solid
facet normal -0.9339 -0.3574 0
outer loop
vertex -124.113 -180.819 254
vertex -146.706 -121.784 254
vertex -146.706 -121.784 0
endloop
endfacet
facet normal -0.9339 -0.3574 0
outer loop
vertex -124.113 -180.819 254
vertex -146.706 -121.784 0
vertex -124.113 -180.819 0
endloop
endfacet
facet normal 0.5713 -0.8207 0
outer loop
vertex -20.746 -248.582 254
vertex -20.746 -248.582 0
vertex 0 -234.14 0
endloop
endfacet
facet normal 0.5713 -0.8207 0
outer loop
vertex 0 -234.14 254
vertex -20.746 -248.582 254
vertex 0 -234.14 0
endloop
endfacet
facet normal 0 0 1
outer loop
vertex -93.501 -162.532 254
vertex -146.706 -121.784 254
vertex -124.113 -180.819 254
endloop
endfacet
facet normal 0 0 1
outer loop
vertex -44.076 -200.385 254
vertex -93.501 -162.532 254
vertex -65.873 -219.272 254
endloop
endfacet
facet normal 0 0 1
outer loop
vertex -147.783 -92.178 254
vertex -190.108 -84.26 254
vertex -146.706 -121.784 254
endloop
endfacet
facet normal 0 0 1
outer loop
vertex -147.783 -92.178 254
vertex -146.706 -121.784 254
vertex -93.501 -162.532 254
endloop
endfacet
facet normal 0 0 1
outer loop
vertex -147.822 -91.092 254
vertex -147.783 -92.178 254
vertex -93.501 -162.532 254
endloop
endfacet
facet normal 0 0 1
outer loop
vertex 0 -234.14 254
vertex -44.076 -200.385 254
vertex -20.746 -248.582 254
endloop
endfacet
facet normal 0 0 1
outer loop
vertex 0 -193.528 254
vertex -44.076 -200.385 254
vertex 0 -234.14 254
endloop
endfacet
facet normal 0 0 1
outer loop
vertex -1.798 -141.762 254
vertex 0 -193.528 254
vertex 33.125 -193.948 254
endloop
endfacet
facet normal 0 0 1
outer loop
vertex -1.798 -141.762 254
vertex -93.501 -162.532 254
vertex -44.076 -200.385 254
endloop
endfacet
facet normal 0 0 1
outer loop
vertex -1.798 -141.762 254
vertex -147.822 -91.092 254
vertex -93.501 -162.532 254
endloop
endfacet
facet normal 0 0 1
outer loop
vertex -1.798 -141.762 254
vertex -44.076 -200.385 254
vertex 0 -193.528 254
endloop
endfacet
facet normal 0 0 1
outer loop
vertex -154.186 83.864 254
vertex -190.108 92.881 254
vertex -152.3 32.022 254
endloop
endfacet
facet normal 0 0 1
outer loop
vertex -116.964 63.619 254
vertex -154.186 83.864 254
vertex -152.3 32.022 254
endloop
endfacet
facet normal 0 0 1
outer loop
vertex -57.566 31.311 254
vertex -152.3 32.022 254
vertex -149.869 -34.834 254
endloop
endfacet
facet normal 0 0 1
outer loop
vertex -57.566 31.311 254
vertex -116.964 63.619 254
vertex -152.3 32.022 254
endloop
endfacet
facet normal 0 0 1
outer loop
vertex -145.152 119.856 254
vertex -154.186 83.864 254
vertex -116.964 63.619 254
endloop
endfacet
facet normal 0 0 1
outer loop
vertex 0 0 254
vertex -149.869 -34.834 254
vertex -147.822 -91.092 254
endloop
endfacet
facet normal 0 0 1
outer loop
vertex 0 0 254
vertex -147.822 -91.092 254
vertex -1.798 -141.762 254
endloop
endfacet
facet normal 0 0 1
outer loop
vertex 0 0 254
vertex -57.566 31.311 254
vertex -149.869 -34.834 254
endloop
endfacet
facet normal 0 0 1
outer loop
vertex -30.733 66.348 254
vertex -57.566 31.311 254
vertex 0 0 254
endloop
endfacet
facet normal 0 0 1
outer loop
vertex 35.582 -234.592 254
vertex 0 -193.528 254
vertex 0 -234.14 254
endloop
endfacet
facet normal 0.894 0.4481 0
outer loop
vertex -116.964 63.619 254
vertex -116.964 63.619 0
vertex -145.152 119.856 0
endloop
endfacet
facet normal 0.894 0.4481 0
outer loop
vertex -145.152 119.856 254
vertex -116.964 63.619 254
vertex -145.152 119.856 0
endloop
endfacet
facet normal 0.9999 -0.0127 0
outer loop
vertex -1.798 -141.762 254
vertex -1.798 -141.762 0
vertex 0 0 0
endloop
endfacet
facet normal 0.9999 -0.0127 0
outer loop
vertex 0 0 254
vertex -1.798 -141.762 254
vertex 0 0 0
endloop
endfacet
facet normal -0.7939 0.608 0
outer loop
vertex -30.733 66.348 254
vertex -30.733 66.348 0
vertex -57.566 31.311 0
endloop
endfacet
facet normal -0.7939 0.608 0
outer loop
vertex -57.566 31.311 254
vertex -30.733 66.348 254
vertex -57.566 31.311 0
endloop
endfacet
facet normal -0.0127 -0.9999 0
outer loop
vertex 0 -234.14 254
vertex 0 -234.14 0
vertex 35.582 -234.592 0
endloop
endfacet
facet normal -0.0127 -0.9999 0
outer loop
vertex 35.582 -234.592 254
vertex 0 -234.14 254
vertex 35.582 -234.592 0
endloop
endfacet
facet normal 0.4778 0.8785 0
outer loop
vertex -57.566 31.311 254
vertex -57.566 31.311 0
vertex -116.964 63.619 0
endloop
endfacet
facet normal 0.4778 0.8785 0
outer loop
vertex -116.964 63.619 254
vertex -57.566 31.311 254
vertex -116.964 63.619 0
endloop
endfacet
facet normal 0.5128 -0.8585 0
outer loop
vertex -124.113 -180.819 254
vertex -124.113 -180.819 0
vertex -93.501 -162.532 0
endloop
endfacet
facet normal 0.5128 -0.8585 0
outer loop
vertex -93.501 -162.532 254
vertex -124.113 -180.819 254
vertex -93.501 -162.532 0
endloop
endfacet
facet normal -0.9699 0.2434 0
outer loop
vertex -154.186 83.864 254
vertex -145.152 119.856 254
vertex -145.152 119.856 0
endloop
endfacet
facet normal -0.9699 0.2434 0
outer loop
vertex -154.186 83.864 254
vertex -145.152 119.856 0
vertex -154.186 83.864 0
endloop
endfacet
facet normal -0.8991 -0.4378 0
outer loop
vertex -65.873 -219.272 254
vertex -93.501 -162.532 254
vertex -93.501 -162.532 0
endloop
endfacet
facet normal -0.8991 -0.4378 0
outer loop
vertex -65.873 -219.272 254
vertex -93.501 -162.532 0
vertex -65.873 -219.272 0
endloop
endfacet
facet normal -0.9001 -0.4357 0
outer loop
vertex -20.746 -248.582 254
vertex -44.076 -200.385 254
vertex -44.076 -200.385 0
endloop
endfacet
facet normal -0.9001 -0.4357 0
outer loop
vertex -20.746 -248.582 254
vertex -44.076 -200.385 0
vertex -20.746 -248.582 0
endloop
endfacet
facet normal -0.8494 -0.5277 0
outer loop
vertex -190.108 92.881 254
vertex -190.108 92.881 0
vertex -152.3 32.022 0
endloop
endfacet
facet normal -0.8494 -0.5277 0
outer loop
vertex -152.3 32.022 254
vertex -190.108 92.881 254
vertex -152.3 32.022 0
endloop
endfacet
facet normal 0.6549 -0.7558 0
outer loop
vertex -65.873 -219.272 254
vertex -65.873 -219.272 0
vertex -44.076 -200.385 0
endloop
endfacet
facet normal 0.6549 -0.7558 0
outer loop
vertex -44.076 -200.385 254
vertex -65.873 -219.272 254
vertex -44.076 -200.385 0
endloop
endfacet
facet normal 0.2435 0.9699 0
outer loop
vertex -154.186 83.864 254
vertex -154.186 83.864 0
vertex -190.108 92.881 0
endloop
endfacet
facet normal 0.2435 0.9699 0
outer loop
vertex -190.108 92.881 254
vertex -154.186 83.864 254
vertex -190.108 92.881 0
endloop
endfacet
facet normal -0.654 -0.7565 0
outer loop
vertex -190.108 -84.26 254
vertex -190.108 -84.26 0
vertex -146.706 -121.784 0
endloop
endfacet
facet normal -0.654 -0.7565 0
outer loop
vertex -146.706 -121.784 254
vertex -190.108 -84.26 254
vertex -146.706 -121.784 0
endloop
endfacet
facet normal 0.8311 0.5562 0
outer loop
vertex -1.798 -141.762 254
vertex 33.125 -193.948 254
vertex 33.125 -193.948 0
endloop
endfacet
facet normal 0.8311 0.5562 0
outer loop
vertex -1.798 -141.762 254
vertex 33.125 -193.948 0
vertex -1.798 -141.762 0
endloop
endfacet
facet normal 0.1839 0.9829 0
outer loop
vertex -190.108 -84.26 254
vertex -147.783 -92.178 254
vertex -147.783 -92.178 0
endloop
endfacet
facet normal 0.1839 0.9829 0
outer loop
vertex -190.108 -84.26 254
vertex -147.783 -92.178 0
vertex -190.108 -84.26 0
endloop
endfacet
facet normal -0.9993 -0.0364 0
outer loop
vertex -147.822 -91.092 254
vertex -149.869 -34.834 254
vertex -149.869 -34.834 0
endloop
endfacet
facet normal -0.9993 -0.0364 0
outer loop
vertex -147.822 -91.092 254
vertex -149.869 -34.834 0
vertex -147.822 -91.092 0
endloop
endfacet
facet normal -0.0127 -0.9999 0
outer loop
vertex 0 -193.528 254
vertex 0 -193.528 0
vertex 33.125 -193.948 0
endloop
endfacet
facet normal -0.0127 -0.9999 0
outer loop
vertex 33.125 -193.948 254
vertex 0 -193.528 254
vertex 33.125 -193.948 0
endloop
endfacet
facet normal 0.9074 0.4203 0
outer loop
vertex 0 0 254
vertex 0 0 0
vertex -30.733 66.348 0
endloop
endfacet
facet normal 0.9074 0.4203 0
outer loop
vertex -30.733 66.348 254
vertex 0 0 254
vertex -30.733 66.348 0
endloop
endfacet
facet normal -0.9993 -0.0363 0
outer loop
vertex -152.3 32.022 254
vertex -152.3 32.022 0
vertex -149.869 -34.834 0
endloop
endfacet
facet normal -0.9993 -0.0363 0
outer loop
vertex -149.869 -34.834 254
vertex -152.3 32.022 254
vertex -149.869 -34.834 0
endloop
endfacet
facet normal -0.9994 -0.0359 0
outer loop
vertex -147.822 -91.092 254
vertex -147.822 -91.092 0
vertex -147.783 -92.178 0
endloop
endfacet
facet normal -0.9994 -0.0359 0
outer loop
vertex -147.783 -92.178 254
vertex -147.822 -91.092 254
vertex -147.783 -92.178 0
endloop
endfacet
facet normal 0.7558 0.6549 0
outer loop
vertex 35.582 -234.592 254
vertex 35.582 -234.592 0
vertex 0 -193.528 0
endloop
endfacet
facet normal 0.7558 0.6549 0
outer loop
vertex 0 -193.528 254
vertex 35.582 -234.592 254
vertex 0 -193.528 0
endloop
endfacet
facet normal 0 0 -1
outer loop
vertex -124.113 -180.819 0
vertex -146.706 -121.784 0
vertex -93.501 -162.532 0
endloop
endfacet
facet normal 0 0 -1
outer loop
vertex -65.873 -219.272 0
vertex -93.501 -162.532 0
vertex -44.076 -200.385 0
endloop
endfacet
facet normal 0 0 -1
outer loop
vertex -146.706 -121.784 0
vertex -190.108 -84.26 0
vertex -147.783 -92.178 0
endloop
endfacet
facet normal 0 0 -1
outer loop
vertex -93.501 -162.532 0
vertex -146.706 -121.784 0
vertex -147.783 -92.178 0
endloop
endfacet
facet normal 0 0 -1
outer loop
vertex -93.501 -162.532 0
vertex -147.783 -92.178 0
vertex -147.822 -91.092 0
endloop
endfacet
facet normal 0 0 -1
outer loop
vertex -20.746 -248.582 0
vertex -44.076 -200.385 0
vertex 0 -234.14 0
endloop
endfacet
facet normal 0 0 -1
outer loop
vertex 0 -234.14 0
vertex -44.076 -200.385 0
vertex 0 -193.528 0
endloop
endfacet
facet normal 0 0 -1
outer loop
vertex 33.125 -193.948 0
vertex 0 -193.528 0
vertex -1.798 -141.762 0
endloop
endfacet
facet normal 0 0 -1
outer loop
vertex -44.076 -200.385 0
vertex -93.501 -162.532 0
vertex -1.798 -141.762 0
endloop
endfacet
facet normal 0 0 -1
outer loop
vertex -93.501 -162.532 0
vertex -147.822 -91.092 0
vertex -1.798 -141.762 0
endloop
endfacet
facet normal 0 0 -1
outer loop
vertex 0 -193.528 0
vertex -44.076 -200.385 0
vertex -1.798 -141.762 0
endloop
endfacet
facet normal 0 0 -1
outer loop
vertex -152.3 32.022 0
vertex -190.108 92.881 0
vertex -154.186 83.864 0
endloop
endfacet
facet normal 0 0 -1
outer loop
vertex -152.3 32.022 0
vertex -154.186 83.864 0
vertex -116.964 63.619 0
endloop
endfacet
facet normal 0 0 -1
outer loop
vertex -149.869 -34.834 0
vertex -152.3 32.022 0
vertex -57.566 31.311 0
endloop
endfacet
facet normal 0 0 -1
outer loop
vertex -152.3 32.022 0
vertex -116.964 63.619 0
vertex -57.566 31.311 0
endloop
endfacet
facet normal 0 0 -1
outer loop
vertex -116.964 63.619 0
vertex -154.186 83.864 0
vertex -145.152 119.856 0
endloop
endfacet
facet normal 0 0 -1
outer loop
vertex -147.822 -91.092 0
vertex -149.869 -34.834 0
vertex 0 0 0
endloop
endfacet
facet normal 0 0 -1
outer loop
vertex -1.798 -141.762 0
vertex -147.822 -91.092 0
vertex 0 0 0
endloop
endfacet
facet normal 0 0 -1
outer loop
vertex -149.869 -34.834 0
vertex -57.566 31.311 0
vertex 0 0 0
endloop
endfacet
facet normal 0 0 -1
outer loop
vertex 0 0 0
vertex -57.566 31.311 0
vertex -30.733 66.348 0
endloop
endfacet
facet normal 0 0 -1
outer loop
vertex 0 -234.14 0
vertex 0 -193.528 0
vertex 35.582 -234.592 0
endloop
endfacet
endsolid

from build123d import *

# Parameters (mm, degrees)
F1_DEPTH = 254


with BuildPart() as f1:
    # F0 (on Top) → F1 (new body)
    with BuildSketch(Plane.XY):
        Polygon((-147.782792, -92.178449), (-146.70594, -121.784464), (-93.500725, -162.532108), (-44.075843, -200.384555), (-2.940414, -231.888456), (-1.797586, -141.762128), (0, 0), (-57.565849, 31.310931), (-116.964364, 63.618676), (-154.185936, 83.864048), (-152.300298, 32.021948), (-149.868549, -34.834455), (-147.822325, -91.091555), (-146.70594, -92.379923), align=None)
        Polygon((-190.108119, -84.259592), (-146.70594, -121.784464), (-147.782792, -92.178449), align=None)
        Polygon((-93.500725, -162.532108), (-146.70594, -121.784464), (-124.113187, -180.818781), align=None)
        Polygon((-44.075843, -200.384555), (-93.500725, -162.532108), (-65.873049, -219.272062), align=None)
        Polygon((-147.822325, -91.091555), (-147.782792, -92.178449), (-146.70594, -92.379923), align=None)
        Polygon((-2.940414, -231.888456), (-44.075843, -200.384555), (-20.746138, -248.582482), (0, -234.140396), align=None)
        Polygon((-1.797586, -141.762128), (-2.940414, -231.888456), (0, -234.140396), (35.582049, -234.591587), (0, -193.527976), (33.124767, -193.948008), align=None)
        Polygon((-190.108119, 92.880812), (-152.300298, 32.021948), (-154.185936, 83.864048), align=None)
        Polygon((-57.565849, 31.310931), (0, 0), (-30.732522, 66.347875), align=None)
        Polygon((-145.151658, 119.856003), (-154.185936, 83.864048), (-116.964364, 63.618676), align=None)
    extrude(amount=F1_DEPTH)


solid = f1.part
